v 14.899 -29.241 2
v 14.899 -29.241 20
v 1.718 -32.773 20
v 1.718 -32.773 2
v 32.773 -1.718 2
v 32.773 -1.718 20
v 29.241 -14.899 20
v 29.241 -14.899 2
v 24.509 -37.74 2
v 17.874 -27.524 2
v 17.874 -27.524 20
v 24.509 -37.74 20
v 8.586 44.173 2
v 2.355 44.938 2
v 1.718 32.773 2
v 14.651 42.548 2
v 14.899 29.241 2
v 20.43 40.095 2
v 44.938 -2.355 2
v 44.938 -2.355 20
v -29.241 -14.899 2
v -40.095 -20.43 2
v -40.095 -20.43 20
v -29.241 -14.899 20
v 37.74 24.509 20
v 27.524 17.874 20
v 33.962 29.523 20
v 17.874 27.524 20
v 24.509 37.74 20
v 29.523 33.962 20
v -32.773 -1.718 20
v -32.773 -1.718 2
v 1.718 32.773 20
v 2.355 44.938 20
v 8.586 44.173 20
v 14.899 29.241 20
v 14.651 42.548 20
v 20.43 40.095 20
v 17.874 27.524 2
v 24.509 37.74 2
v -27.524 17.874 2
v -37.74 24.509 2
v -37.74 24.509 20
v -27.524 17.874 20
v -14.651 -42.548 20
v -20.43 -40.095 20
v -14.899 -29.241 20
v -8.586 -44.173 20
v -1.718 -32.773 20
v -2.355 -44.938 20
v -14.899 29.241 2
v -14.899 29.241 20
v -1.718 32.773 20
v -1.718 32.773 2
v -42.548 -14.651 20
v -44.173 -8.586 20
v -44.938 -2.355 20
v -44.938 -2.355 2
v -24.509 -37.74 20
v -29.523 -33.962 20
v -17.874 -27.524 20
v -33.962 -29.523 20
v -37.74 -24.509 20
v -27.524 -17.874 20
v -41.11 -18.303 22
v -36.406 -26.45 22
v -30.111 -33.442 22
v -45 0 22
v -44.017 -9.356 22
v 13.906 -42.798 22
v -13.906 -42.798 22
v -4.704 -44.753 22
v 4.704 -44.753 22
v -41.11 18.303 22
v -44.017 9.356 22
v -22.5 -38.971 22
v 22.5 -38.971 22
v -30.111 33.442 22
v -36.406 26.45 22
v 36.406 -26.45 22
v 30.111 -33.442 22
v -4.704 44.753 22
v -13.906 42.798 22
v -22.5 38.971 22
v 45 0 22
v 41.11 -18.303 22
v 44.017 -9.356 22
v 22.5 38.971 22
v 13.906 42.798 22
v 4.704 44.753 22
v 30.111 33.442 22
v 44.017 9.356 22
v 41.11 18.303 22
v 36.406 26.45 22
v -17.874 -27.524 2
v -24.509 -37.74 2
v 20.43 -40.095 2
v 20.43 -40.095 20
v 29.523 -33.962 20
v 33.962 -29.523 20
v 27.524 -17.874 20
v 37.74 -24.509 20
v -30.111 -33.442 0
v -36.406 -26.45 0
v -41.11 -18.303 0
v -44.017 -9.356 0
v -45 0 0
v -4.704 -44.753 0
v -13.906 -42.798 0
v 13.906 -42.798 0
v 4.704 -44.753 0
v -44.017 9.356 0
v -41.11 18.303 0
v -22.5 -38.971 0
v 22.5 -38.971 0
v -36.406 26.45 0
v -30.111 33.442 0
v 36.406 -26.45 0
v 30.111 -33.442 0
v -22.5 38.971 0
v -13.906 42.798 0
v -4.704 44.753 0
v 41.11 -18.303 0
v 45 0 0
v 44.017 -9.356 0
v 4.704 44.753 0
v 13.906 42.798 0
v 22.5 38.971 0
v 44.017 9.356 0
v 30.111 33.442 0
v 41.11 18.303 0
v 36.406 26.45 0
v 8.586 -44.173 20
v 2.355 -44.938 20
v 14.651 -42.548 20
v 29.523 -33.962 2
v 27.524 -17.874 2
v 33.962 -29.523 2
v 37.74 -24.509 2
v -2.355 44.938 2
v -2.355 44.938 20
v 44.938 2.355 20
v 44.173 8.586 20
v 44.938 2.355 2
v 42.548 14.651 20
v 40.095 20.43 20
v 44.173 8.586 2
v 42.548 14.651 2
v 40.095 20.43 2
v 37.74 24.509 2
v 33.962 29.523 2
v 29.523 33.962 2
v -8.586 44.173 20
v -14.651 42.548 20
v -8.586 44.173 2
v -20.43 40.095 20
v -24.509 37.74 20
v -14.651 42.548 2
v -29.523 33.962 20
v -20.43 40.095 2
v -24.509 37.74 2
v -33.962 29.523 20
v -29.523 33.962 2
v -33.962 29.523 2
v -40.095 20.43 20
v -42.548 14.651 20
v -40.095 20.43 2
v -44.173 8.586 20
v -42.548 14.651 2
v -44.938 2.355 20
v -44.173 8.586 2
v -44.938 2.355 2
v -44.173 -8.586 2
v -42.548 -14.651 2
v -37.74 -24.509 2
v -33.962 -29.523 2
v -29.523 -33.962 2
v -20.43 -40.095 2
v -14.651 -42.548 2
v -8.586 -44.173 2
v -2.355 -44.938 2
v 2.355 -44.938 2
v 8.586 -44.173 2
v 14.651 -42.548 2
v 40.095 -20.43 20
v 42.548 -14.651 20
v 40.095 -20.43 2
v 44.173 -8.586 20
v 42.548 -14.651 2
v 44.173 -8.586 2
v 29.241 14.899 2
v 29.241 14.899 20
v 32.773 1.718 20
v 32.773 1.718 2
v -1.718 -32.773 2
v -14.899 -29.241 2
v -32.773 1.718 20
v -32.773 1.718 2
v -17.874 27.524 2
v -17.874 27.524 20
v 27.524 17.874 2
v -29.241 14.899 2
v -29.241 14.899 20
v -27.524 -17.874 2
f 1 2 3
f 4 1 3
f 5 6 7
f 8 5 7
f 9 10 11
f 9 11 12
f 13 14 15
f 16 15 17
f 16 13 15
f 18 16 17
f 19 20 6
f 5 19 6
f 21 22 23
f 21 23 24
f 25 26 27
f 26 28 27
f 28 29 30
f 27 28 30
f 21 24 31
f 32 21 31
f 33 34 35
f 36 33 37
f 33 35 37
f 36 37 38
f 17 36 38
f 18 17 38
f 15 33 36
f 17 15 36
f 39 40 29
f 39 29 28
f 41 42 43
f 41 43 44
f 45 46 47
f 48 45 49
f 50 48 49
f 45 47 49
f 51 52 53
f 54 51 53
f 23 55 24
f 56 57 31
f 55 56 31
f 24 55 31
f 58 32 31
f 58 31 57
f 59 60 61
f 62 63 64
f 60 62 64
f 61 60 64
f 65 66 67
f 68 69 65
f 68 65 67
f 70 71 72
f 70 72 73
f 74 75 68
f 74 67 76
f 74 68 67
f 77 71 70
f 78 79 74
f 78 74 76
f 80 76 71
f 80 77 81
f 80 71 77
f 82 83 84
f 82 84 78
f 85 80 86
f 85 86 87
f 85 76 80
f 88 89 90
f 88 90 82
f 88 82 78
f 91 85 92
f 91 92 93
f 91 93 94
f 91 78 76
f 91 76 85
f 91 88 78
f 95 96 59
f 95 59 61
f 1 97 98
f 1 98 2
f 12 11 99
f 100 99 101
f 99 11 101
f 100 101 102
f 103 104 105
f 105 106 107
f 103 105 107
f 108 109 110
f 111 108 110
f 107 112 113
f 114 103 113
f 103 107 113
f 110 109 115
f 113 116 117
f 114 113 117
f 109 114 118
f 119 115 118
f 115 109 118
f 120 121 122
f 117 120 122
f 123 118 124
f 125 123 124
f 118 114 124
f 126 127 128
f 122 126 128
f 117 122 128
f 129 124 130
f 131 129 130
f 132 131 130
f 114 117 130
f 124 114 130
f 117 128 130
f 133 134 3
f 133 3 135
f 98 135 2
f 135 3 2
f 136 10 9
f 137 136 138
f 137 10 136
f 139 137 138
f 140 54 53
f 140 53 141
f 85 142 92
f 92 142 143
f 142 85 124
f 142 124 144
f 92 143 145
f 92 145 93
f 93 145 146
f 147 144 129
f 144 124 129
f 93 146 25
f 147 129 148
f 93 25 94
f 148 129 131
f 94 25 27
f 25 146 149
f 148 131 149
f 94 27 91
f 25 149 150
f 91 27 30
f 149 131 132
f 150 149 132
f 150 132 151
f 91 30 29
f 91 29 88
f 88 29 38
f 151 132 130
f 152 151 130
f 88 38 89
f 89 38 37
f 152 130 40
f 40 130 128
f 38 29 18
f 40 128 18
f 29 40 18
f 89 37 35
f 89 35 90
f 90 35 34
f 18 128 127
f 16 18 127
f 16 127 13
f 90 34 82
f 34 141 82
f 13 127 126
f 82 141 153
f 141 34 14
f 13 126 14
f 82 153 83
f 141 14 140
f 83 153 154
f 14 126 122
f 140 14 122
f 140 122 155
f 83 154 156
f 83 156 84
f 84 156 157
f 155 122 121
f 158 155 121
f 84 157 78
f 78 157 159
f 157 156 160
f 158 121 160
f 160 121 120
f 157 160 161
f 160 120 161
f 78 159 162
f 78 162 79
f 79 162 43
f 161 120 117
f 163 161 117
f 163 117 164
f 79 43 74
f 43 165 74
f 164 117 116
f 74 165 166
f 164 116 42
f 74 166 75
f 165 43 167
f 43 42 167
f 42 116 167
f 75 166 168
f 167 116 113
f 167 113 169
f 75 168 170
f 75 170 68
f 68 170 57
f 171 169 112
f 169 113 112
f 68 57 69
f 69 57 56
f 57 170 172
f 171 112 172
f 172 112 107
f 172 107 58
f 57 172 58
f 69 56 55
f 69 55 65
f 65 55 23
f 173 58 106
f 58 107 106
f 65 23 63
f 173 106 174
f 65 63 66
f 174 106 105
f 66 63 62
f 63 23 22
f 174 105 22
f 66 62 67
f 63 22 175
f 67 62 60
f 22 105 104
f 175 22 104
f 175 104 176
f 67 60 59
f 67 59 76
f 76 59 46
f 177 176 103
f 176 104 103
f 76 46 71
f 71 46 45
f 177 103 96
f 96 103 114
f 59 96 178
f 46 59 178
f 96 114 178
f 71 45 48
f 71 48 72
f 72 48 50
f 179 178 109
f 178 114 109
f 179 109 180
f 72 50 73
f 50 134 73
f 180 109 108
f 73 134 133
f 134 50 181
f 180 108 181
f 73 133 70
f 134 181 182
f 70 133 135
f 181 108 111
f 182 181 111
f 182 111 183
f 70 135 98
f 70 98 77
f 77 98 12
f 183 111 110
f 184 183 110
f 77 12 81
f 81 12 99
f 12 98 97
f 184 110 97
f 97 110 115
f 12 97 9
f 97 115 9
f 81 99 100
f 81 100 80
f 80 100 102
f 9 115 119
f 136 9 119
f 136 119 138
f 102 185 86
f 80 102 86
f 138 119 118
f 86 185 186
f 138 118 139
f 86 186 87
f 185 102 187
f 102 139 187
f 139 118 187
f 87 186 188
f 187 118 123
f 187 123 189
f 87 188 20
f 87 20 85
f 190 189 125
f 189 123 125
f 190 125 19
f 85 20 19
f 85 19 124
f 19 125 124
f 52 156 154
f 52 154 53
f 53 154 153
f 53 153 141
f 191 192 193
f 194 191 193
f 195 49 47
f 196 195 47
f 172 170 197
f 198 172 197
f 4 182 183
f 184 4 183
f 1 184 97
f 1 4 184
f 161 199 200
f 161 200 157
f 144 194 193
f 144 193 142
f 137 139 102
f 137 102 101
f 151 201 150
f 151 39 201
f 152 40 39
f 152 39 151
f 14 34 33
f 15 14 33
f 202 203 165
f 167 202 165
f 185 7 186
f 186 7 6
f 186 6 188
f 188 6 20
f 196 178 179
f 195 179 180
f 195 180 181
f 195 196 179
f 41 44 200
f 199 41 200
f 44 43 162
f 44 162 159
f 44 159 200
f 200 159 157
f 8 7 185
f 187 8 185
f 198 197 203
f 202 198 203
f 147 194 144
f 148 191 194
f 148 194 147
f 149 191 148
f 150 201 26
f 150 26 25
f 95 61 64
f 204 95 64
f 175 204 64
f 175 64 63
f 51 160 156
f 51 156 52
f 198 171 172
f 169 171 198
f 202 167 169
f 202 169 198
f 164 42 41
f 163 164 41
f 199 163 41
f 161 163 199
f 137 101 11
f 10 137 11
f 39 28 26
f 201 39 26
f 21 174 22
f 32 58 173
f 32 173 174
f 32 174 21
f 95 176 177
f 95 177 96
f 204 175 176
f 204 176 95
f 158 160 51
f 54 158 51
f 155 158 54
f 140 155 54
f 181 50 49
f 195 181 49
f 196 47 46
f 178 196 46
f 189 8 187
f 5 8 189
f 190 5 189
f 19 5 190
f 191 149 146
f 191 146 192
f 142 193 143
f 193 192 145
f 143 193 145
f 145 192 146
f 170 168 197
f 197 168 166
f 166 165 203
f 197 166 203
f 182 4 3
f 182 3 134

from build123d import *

# Parameters (mm, degrees)
F0_R     = 45
F1_DEPTH = 20
F3_DEPTH = 18
F4_R     = 45
F5_DEPTH = 2


with BuildPart() as f1:
    # F0 (on Top) → F1 (new body)
    with BuildSketch(Plane.XY):
        Circle(F0_R)
    extrude(amount=F1_DEPTH)

    # F2 (on face) → F3 (cut)
    with BuildSketch(Plane.XY.offset(20)):
        with BuildLine():
            Line((29.241279, 14.899176), (32.773278, 1.717575))
            Line((32.773278, 1.717575), (44.938329, 2.355118))
            ThreePointArc((44.938329, 2.355118), (43.466662, 11.646857), (40.095294, 20.429572))
            Line((40.095294, 20.429572), (29.241279, 14.899176))
        make_face()
        with BuildLine():
            Line((27.523704, 17.874102), (37.740176, 24.508757))
            ThreePointArc((37.740176, 24.508757), (31.819805, 31.819805), (24.508757, 37.740176))
            Line((24.508757, 37.740176), (17.874102, 27.523704))
            Line((17.874102, 27.523704), (27.523704, 17.874102))
        make_face()
        with BuildLine():
            ThreePointArc((20.429572, 40.095294), (11.646857, 43.466662), (2.355118, 44.938329))
            Line((2.355118, 44.938329), (1.717575, 32.773278))
            Line((1.717575, 32.773278), (14.899176, 29.241279))
            Line((14.899176, 29.241279), (20.429572, 40.095294))
        make_face()
        with BuildLine():
            ThreePointArc((-40.095294, 20.429572), (-43.466662, 11.646857), (-44.938329, 2.355118))
            Line((-44.938329, 2.355118), (-32.773278, 1.717575))
            Line((-32.773278, 1.717575), (-29.241279, 14.899176))
            Line((-29.241279, 14.899176), (-40.095294, 20.429572))
        make_face()
        with BuildLine():
            ThreePointArc((-24.508757, 37.740176), (-31.819805, 31.819805), (-37.740176, 24.508757))
            Line((-37.740176, 24.508757), (-27.523704, 17.874102))
            Line((-27.523704, 17.874102), (-17.874102, 27.523704))
            Line((-17.874102, 27.523704), (-24.508757, 37.740176))
        make_face()
        with BuildLine():
            ThreePointArc((-2.355118, 44.938329), (-11.646857, 43.466662), (-20.429572, 40.095294))
            Line((-20.429572, 40.095294), (-14.899176, 29.241279))
            Line((-14.899176, 29.241279), (-1.717575, 32.773278))
            Line((-1.717575, 32.773278), (-2.355118, 44.938329))
        make_face()
        with BuildLine():
            ThreePointArc((-20.429572, -40.095294), (-11.646857, -43.466662), (-2.355118, -44.938329))
            Line((-2.355118, -44.938329), (-1.717575, -32.773278))
            Line((-1.717575, -32.773278), (-14.899176, -29.241279))
            Line((-14.899176, -29.241279), (-20.429572, -40.095294))
        make_face()
        with BuildLine():
            ThreePointArc((-37.740176, -24.508757), (-31.819805, -31.819805), (-24.508757, -37.740176))
            Line((-24.508757, -37.740176), (-17.874102, -27.523704))
            Line((-17.874102, -27.523704), (-27.523704, -17.874102))
            Line((-27.523704, -17.874102), (-37.740176, -24.508757))
        make_face()
        with BuildLine():
            ThreePointArc((-44.938329, -2.355118), (-43.466662, -11.646857), (-40.095294, -20.429572))
            Line((-40.095294, -20.429572), (-29.241279, -14.899176))
            Line((-29.241279, -14.899176), (-32.773278, -1.717575))
            Line((-32.773278, -1.717575), (-44.938329, -2.355118))
        make_face()
        with BuildLine():
            ThreePointArc((40.095294, -20.429572), (43.466662, -11.646857), (44.938329, -2.355118))
            Line((44.938329, -2.355118), (32.773278, -1.717575))
            Line((32.773278, -1.717575), (29.241279, -14.899176))
            Line((29.241279, -14.899176), (40.095294, -20.429572))
        make_face()
        with BuildLine():
            ThreePointArc((24.508757, -37.740176), (31.819805, -31.819805), (37.740176, -24.508757))
            Line((37.740176, -24.508757), (27.523704, -17.874102))
            Line((27.523704, -17.874102), (17.874102, -27.523704))
            Line((17.874102, -27.523704), (24.508757, -37.740176))
        make_face()
        with BuildLine():
            ThreePointArc((2.355118, -44.938329), (11.646857, -43.466662), (20.429572, -40.095294))
            Line((20.429572, -40.095294), (14.899176, -29.241279))
            Line((14.899176, -29.241279), (1.717575, -32.773278))
            Line((1.717575, -32.773278), (2.355118, -44.938329))
        make_face()
    extrude(amount=-F3_DEPTH, mode=Mode.SUBTRACT)

    # F4 (on face) → F5 (join)
    with BuildSketch(Plane.XY.offset(20)):
        Circle(F4_R)
    extrude(amount=F5_DEPTH)


solid = f1.part
